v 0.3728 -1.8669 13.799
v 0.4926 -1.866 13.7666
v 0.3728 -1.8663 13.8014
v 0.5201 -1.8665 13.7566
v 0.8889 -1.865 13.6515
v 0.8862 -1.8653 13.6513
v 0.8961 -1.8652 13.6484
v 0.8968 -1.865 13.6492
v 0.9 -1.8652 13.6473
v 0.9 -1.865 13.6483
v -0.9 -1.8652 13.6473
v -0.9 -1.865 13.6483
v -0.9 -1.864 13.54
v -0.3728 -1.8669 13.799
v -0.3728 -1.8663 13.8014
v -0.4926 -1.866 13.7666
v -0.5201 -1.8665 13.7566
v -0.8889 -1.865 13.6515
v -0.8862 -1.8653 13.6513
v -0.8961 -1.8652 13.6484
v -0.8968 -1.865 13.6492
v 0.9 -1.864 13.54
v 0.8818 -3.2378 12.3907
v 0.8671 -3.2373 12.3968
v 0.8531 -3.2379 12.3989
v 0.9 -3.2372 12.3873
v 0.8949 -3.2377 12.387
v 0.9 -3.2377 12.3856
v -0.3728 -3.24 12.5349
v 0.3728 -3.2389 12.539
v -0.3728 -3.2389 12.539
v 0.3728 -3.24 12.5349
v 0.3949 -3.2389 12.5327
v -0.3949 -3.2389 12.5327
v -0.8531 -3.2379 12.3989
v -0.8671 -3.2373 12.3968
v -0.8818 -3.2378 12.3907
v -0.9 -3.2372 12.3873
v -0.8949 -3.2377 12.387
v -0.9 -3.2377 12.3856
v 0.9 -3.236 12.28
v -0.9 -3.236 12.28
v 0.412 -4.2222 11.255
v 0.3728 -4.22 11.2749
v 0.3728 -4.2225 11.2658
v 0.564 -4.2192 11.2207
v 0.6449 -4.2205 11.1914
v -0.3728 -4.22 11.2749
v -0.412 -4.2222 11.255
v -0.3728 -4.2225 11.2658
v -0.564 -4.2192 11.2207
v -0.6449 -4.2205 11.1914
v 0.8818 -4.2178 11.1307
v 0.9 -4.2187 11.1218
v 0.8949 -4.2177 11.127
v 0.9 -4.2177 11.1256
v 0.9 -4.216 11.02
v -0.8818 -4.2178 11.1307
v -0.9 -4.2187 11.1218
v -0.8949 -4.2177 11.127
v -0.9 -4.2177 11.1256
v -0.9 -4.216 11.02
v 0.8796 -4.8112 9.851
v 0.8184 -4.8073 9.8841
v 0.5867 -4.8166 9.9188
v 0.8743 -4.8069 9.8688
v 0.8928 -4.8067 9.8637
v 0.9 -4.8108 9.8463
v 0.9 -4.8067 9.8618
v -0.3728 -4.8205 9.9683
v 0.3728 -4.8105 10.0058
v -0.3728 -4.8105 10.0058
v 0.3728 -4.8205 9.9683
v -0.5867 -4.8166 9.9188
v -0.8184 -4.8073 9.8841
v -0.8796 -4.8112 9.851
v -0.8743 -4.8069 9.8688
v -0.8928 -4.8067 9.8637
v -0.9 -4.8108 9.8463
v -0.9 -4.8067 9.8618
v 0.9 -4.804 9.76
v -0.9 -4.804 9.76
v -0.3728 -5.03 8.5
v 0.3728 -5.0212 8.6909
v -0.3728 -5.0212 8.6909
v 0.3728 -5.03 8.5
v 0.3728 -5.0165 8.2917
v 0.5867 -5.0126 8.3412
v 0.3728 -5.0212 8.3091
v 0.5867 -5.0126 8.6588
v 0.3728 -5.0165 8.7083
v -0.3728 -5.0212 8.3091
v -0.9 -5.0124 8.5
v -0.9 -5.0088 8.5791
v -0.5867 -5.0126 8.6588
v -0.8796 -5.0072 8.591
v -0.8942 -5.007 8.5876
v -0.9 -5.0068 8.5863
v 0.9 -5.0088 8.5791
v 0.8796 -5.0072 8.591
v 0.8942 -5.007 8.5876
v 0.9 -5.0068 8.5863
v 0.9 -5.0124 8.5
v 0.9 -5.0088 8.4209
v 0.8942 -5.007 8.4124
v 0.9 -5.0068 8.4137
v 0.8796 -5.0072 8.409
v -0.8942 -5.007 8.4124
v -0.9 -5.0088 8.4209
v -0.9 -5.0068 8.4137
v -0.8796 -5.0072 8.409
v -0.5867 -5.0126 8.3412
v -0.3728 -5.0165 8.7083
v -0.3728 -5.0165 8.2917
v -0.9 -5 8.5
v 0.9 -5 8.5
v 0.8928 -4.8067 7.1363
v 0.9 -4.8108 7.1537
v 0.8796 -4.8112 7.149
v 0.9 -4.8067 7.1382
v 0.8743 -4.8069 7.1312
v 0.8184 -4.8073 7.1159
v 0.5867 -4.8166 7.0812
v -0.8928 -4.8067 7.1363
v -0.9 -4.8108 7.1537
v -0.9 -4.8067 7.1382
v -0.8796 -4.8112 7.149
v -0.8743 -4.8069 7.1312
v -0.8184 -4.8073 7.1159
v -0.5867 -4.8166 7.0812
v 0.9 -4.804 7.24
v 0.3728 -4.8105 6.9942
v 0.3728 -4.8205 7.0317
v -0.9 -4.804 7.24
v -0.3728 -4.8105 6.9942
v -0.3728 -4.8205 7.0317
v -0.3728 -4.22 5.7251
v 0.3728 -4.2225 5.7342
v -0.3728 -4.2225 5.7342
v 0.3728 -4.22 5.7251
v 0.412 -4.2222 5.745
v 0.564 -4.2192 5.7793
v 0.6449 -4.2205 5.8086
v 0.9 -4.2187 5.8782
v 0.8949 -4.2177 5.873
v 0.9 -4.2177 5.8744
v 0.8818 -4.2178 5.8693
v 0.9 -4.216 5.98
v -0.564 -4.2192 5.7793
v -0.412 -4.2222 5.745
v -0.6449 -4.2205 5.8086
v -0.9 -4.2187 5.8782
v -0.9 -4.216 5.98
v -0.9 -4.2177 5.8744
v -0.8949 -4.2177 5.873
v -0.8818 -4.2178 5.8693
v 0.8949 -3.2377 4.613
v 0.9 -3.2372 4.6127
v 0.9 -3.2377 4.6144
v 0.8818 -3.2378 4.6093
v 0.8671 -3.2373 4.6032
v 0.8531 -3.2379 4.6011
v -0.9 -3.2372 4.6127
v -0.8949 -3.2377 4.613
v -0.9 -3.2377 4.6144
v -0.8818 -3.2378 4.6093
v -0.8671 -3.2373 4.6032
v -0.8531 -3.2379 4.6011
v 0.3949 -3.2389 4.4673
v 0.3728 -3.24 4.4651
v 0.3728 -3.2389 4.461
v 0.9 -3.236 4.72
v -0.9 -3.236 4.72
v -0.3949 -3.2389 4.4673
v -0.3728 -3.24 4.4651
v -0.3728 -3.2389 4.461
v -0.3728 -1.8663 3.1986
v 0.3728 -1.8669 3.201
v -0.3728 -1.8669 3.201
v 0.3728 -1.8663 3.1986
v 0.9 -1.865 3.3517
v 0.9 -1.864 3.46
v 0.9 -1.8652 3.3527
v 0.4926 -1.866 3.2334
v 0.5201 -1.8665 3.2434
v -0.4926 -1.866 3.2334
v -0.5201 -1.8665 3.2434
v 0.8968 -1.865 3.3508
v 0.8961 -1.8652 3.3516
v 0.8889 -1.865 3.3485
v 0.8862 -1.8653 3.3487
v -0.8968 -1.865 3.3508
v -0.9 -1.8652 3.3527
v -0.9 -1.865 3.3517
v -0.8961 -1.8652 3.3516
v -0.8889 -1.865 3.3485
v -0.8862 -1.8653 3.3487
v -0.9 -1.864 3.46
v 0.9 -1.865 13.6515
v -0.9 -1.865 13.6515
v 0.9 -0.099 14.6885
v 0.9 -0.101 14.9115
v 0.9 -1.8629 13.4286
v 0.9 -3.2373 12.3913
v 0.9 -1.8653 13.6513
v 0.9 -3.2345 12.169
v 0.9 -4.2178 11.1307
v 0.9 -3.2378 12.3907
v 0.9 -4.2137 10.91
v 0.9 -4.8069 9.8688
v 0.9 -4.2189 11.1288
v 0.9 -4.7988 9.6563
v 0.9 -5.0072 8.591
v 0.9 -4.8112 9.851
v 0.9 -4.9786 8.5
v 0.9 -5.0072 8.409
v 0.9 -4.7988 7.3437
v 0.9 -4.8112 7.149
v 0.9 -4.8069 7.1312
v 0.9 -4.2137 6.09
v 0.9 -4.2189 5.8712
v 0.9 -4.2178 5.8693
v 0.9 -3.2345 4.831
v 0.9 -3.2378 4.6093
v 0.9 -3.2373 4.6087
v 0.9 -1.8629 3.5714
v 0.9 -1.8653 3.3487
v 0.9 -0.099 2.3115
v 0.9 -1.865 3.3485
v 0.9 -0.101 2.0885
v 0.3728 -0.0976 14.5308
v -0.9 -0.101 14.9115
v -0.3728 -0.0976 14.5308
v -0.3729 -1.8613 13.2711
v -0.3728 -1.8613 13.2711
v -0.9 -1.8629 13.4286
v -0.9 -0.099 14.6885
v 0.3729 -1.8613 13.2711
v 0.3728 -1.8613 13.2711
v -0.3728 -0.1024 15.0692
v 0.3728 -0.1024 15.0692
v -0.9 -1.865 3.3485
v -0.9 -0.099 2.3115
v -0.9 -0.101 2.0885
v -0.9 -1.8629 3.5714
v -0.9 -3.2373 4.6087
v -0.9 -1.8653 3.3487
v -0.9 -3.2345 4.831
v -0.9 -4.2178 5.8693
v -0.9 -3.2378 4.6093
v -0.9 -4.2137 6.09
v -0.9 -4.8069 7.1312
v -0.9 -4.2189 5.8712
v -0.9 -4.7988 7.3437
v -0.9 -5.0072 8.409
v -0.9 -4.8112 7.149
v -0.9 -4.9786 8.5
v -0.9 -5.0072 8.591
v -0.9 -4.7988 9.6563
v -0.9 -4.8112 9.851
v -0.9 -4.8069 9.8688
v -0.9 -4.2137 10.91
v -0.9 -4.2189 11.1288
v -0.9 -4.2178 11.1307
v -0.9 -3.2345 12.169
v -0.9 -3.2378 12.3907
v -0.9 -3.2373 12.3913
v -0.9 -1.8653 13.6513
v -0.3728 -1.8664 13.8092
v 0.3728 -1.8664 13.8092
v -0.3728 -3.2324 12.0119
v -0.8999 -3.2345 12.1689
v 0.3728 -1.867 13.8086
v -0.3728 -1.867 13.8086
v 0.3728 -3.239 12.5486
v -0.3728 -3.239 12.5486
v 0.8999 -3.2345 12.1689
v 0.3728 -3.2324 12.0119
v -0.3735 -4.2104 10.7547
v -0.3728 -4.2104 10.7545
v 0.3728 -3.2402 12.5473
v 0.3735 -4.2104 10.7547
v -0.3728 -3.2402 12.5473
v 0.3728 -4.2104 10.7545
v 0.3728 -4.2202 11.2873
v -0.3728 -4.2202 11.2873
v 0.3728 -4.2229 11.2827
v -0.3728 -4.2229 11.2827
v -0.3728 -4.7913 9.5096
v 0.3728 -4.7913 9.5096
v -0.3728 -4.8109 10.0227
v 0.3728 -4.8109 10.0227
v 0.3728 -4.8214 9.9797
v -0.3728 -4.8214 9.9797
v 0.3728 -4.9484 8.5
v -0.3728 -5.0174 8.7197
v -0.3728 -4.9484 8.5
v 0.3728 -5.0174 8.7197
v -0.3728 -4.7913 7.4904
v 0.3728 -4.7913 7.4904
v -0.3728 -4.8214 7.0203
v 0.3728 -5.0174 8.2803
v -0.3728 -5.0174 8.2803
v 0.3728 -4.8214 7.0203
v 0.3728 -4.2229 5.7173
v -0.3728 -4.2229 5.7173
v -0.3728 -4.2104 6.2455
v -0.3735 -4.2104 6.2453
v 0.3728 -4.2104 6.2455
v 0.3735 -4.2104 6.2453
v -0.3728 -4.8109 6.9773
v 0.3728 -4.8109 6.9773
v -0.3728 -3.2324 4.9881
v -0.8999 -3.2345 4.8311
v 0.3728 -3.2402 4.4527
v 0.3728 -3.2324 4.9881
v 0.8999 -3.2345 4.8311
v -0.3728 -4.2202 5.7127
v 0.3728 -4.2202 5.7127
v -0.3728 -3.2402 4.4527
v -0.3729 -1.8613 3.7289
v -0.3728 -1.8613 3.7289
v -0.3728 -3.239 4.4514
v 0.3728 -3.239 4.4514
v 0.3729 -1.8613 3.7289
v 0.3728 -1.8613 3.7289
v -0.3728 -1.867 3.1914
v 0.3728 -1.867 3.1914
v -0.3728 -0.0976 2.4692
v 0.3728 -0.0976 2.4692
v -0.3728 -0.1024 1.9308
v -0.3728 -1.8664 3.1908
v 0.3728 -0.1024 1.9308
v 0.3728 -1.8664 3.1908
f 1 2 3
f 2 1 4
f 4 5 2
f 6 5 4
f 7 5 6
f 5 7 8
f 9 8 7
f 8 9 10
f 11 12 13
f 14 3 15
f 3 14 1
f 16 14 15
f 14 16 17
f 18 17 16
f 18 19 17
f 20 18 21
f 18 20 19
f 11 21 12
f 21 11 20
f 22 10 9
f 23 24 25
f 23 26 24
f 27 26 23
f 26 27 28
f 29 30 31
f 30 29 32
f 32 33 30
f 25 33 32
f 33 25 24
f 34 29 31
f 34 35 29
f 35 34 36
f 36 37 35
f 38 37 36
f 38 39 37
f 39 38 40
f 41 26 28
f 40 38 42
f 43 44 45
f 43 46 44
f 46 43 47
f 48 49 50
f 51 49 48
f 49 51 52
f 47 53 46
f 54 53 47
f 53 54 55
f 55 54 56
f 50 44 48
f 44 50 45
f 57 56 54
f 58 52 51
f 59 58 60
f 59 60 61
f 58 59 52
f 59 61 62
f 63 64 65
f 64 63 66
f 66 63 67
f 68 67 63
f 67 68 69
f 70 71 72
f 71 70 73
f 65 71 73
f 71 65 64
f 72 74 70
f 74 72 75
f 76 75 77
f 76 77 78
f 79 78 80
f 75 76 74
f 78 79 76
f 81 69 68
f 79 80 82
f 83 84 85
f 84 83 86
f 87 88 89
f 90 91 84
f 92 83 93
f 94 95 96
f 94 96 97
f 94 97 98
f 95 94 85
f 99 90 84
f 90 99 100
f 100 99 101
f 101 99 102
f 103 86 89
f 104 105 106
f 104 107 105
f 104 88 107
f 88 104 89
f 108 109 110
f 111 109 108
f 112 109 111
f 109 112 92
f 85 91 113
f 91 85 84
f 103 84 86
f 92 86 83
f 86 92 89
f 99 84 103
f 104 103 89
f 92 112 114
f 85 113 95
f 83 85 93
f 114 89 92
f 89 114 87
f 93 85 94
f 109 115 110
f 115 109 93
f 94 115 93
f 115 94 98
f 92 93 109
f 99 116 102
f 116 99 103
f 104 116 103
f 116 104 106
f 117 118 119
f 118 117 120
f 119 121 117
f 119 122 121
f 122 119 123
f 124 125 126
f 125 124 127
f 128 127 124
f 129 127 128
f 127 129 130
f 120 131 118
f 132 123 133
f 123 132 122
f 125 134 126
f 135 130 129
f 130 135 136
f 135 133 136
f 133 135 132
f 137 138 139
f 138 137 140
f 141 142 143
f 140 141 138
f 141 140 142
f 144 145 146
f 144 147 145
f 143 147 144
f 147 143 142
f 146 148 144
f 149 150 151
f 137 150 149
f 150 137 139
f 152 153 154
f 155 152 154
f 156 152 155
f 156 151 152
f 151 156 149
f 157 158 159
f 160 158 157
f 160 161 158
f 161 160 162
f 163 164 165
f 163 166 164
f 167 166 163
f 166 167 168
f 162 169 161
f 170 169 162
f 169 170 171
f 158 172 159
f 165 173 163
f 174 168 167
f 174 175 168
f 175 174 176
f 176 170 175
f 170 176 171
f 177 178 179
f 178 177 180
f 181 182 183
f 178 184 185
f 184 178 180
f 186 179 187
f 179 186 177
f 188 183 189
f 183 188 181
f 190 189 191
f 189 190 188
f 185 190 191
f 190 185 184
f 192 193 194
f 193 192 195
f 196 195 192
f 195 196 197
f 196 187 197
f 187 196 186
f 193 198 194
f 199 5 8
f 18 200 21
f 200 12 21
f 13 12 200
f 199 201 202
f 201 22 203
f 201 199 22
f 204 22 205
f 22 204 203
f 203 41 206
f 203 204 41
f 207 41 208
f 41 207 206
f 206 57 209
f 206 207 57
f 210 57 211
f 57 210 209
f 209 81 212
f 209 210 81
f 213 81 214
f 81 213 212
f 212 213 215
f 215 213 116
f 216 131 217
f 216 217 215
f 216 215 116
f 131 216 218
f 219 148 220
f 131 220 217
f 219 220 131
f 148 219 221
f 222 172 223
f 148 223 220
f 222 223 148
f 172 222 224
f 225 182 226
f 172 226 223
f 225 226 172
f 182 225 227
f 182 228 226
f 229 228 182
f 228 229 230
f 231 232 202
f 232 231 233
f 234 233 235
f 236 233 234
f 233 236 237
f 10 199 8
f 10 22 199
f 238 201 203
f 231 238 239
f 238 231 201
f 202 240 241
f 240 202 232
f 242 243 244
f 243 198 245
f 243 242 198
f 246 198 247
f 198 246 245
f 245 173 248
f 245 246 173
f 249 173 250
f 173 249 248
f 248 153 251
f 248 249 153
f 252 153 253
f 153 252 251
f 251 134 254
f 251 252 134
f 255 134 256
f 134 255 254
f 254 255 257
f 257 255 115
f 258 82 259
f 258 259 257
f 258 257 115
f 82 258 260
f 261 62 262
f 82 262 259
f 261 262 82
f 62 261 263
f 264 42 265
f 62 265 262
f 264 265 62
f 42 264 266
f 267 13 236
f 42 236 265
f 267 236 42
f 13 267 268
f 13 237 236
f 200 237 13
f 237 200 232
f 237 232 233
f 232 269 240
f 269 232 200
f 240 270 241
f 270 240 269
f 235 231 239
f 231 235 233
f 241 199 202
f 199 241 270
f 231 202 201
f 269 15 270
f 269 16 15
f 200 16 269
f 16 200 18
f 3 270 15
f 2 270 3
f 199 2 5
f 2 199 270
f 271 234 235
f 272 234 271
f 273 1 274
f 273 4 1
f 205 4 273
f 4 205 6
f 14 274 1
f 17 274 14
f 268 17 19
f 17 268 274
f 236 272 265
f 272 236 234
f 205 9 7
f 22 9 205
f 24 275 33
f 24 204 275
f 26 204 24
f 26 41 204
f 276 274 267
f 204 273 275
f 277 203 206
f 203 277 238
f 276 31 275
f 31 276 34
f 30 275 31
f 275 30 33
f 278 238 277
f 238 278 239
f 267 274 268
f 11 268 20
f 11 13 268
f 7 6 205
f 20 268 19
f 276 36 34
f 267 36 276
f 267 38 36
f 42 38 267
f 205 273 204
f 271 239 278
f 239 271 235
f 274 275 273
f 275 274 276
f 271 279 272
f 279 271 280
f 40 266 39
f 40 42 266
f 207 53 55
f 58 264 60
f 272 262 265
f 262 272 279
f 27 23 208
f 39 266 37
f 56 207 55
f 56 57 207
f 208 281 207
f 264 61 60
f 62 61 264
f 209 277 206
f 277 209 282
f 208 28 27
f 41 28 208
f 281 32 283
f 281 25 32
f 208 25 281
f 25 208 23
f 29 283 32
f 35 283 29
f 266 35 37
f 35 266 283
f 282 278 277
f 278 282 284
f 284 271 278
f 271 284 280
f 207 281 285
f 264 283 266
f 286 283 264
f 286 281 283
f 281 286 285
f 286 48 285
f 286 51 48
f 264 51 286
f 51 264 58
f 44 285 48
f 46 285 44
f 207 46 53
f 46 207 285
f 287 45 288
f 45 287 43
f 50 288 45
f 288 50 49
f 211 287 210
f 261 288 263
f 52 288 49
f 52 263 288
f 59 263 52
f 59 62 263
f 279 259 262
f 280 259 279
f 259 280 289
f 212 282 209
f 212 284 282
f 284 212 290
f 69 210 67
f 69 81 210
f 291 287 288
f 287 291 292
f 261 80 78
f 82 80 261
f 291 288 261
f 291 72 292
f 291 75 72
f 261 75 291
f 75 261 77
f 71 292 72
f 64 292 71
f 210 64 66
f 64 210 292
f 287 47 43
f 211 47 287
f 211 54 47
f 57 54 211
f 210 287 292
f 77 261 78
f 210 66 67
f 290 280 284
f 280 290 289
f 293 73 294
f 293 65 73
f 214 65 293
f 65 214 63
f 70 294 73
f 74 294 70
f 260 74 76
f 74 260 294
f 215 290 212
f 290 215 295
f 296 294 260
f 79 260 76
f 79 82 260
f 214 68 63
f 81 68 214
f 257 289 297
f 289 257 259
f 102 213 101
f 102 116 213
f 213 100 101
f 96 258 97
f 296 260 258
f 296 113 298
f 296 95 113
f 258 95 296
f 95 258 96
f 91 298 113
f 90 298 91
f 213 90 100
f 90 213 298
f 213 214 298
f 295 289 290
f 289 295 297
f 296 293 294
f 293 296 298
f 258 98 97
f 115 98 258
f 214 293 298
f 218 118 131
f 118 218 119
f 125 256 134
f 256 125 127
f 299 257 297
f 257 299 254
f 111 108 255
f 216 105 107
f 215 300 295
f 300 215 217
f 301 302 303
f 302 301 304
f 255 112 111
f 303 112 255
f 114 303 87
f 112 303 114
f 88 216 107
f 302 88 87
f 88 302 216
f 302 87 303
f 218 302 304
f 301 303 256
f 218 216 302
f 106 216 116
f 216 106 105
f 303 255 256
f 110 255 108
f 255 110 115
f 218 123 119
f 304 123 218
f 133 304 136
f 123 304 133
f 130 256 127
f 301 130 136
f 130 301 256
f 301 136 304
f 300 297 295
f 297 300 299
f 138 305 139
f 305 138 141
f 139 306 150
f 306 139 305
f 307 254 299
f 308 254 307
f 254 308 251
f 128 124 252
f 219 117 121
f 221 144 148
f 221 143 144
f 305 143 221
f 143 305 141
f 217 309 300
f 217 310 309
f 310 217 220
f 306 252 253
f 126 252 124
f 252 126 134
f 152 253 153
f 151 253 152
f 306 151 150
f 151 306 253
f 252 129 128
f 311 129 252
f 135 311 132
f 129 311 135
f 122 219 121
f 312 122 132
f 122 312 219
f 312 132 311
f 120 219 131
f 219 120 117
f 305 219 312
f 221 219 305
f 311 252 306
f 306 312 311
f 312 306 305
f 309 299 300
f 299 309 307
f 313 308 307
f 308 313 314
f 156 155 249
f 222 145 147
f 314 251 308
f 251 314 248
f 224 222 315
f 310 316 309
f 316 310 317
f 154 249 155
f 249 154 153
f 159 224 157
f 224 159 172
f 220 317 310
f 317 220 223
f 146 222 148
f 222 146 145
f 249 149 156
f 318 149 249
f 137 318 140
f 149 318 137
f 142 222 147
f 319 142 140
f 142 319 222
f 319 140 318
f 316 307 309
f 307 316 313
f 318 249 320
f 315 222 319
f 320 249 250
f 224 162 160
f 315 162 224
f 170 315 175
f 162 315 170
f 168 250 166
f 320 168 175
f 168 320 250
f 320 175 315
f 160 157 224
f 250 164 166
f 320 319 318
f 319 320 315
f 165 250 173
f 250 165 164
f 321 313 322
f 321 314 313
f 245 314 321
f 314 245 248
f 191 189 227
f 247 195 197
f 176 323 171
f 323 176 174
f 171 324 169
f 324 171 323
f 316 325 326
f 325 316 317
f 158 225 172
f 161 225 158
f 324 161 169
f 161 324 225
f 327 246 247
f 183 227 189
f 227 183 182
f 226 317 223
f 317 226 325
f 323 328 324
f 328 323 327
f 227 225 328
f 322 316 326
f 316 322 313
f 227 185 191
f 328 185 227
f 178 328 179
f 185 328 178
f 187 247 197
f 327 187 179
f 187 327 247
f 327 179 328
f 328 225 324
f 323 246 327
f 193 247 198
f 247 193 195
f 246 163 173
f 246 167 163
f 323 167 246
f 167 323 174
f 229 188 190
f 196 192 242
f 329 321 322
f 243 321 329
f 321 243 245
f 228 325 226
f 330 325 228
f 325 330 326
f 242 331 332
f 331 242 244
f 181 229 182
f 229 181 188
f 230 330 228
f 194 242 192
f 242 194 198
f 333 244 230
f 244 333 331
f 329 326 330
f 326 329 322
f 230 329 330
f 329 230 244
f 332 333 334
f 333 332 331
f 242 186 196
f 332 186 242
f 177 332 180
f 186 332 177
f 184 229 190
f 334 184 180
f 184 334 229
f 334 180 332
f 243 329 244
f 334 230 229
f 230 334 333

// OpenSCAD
use <lib.scad>;

hd = 72;
ld = 16;
vld = 8;

module tower() {
	union() {
		translate([0,0,7.5]) cyl(0.5, 0.4, 15.0);
		translate([0,0,1]) cyl(1, 1, 2);
	}
}

module blade() {
	translate([0,-5,8.5]) rotate([0,90,0])
		scale([0.9,0.1,3]) parabola(1,0,0, .3, -7, 7, 10);
}

//tower($fn=vld);
blade($fn=vld);
